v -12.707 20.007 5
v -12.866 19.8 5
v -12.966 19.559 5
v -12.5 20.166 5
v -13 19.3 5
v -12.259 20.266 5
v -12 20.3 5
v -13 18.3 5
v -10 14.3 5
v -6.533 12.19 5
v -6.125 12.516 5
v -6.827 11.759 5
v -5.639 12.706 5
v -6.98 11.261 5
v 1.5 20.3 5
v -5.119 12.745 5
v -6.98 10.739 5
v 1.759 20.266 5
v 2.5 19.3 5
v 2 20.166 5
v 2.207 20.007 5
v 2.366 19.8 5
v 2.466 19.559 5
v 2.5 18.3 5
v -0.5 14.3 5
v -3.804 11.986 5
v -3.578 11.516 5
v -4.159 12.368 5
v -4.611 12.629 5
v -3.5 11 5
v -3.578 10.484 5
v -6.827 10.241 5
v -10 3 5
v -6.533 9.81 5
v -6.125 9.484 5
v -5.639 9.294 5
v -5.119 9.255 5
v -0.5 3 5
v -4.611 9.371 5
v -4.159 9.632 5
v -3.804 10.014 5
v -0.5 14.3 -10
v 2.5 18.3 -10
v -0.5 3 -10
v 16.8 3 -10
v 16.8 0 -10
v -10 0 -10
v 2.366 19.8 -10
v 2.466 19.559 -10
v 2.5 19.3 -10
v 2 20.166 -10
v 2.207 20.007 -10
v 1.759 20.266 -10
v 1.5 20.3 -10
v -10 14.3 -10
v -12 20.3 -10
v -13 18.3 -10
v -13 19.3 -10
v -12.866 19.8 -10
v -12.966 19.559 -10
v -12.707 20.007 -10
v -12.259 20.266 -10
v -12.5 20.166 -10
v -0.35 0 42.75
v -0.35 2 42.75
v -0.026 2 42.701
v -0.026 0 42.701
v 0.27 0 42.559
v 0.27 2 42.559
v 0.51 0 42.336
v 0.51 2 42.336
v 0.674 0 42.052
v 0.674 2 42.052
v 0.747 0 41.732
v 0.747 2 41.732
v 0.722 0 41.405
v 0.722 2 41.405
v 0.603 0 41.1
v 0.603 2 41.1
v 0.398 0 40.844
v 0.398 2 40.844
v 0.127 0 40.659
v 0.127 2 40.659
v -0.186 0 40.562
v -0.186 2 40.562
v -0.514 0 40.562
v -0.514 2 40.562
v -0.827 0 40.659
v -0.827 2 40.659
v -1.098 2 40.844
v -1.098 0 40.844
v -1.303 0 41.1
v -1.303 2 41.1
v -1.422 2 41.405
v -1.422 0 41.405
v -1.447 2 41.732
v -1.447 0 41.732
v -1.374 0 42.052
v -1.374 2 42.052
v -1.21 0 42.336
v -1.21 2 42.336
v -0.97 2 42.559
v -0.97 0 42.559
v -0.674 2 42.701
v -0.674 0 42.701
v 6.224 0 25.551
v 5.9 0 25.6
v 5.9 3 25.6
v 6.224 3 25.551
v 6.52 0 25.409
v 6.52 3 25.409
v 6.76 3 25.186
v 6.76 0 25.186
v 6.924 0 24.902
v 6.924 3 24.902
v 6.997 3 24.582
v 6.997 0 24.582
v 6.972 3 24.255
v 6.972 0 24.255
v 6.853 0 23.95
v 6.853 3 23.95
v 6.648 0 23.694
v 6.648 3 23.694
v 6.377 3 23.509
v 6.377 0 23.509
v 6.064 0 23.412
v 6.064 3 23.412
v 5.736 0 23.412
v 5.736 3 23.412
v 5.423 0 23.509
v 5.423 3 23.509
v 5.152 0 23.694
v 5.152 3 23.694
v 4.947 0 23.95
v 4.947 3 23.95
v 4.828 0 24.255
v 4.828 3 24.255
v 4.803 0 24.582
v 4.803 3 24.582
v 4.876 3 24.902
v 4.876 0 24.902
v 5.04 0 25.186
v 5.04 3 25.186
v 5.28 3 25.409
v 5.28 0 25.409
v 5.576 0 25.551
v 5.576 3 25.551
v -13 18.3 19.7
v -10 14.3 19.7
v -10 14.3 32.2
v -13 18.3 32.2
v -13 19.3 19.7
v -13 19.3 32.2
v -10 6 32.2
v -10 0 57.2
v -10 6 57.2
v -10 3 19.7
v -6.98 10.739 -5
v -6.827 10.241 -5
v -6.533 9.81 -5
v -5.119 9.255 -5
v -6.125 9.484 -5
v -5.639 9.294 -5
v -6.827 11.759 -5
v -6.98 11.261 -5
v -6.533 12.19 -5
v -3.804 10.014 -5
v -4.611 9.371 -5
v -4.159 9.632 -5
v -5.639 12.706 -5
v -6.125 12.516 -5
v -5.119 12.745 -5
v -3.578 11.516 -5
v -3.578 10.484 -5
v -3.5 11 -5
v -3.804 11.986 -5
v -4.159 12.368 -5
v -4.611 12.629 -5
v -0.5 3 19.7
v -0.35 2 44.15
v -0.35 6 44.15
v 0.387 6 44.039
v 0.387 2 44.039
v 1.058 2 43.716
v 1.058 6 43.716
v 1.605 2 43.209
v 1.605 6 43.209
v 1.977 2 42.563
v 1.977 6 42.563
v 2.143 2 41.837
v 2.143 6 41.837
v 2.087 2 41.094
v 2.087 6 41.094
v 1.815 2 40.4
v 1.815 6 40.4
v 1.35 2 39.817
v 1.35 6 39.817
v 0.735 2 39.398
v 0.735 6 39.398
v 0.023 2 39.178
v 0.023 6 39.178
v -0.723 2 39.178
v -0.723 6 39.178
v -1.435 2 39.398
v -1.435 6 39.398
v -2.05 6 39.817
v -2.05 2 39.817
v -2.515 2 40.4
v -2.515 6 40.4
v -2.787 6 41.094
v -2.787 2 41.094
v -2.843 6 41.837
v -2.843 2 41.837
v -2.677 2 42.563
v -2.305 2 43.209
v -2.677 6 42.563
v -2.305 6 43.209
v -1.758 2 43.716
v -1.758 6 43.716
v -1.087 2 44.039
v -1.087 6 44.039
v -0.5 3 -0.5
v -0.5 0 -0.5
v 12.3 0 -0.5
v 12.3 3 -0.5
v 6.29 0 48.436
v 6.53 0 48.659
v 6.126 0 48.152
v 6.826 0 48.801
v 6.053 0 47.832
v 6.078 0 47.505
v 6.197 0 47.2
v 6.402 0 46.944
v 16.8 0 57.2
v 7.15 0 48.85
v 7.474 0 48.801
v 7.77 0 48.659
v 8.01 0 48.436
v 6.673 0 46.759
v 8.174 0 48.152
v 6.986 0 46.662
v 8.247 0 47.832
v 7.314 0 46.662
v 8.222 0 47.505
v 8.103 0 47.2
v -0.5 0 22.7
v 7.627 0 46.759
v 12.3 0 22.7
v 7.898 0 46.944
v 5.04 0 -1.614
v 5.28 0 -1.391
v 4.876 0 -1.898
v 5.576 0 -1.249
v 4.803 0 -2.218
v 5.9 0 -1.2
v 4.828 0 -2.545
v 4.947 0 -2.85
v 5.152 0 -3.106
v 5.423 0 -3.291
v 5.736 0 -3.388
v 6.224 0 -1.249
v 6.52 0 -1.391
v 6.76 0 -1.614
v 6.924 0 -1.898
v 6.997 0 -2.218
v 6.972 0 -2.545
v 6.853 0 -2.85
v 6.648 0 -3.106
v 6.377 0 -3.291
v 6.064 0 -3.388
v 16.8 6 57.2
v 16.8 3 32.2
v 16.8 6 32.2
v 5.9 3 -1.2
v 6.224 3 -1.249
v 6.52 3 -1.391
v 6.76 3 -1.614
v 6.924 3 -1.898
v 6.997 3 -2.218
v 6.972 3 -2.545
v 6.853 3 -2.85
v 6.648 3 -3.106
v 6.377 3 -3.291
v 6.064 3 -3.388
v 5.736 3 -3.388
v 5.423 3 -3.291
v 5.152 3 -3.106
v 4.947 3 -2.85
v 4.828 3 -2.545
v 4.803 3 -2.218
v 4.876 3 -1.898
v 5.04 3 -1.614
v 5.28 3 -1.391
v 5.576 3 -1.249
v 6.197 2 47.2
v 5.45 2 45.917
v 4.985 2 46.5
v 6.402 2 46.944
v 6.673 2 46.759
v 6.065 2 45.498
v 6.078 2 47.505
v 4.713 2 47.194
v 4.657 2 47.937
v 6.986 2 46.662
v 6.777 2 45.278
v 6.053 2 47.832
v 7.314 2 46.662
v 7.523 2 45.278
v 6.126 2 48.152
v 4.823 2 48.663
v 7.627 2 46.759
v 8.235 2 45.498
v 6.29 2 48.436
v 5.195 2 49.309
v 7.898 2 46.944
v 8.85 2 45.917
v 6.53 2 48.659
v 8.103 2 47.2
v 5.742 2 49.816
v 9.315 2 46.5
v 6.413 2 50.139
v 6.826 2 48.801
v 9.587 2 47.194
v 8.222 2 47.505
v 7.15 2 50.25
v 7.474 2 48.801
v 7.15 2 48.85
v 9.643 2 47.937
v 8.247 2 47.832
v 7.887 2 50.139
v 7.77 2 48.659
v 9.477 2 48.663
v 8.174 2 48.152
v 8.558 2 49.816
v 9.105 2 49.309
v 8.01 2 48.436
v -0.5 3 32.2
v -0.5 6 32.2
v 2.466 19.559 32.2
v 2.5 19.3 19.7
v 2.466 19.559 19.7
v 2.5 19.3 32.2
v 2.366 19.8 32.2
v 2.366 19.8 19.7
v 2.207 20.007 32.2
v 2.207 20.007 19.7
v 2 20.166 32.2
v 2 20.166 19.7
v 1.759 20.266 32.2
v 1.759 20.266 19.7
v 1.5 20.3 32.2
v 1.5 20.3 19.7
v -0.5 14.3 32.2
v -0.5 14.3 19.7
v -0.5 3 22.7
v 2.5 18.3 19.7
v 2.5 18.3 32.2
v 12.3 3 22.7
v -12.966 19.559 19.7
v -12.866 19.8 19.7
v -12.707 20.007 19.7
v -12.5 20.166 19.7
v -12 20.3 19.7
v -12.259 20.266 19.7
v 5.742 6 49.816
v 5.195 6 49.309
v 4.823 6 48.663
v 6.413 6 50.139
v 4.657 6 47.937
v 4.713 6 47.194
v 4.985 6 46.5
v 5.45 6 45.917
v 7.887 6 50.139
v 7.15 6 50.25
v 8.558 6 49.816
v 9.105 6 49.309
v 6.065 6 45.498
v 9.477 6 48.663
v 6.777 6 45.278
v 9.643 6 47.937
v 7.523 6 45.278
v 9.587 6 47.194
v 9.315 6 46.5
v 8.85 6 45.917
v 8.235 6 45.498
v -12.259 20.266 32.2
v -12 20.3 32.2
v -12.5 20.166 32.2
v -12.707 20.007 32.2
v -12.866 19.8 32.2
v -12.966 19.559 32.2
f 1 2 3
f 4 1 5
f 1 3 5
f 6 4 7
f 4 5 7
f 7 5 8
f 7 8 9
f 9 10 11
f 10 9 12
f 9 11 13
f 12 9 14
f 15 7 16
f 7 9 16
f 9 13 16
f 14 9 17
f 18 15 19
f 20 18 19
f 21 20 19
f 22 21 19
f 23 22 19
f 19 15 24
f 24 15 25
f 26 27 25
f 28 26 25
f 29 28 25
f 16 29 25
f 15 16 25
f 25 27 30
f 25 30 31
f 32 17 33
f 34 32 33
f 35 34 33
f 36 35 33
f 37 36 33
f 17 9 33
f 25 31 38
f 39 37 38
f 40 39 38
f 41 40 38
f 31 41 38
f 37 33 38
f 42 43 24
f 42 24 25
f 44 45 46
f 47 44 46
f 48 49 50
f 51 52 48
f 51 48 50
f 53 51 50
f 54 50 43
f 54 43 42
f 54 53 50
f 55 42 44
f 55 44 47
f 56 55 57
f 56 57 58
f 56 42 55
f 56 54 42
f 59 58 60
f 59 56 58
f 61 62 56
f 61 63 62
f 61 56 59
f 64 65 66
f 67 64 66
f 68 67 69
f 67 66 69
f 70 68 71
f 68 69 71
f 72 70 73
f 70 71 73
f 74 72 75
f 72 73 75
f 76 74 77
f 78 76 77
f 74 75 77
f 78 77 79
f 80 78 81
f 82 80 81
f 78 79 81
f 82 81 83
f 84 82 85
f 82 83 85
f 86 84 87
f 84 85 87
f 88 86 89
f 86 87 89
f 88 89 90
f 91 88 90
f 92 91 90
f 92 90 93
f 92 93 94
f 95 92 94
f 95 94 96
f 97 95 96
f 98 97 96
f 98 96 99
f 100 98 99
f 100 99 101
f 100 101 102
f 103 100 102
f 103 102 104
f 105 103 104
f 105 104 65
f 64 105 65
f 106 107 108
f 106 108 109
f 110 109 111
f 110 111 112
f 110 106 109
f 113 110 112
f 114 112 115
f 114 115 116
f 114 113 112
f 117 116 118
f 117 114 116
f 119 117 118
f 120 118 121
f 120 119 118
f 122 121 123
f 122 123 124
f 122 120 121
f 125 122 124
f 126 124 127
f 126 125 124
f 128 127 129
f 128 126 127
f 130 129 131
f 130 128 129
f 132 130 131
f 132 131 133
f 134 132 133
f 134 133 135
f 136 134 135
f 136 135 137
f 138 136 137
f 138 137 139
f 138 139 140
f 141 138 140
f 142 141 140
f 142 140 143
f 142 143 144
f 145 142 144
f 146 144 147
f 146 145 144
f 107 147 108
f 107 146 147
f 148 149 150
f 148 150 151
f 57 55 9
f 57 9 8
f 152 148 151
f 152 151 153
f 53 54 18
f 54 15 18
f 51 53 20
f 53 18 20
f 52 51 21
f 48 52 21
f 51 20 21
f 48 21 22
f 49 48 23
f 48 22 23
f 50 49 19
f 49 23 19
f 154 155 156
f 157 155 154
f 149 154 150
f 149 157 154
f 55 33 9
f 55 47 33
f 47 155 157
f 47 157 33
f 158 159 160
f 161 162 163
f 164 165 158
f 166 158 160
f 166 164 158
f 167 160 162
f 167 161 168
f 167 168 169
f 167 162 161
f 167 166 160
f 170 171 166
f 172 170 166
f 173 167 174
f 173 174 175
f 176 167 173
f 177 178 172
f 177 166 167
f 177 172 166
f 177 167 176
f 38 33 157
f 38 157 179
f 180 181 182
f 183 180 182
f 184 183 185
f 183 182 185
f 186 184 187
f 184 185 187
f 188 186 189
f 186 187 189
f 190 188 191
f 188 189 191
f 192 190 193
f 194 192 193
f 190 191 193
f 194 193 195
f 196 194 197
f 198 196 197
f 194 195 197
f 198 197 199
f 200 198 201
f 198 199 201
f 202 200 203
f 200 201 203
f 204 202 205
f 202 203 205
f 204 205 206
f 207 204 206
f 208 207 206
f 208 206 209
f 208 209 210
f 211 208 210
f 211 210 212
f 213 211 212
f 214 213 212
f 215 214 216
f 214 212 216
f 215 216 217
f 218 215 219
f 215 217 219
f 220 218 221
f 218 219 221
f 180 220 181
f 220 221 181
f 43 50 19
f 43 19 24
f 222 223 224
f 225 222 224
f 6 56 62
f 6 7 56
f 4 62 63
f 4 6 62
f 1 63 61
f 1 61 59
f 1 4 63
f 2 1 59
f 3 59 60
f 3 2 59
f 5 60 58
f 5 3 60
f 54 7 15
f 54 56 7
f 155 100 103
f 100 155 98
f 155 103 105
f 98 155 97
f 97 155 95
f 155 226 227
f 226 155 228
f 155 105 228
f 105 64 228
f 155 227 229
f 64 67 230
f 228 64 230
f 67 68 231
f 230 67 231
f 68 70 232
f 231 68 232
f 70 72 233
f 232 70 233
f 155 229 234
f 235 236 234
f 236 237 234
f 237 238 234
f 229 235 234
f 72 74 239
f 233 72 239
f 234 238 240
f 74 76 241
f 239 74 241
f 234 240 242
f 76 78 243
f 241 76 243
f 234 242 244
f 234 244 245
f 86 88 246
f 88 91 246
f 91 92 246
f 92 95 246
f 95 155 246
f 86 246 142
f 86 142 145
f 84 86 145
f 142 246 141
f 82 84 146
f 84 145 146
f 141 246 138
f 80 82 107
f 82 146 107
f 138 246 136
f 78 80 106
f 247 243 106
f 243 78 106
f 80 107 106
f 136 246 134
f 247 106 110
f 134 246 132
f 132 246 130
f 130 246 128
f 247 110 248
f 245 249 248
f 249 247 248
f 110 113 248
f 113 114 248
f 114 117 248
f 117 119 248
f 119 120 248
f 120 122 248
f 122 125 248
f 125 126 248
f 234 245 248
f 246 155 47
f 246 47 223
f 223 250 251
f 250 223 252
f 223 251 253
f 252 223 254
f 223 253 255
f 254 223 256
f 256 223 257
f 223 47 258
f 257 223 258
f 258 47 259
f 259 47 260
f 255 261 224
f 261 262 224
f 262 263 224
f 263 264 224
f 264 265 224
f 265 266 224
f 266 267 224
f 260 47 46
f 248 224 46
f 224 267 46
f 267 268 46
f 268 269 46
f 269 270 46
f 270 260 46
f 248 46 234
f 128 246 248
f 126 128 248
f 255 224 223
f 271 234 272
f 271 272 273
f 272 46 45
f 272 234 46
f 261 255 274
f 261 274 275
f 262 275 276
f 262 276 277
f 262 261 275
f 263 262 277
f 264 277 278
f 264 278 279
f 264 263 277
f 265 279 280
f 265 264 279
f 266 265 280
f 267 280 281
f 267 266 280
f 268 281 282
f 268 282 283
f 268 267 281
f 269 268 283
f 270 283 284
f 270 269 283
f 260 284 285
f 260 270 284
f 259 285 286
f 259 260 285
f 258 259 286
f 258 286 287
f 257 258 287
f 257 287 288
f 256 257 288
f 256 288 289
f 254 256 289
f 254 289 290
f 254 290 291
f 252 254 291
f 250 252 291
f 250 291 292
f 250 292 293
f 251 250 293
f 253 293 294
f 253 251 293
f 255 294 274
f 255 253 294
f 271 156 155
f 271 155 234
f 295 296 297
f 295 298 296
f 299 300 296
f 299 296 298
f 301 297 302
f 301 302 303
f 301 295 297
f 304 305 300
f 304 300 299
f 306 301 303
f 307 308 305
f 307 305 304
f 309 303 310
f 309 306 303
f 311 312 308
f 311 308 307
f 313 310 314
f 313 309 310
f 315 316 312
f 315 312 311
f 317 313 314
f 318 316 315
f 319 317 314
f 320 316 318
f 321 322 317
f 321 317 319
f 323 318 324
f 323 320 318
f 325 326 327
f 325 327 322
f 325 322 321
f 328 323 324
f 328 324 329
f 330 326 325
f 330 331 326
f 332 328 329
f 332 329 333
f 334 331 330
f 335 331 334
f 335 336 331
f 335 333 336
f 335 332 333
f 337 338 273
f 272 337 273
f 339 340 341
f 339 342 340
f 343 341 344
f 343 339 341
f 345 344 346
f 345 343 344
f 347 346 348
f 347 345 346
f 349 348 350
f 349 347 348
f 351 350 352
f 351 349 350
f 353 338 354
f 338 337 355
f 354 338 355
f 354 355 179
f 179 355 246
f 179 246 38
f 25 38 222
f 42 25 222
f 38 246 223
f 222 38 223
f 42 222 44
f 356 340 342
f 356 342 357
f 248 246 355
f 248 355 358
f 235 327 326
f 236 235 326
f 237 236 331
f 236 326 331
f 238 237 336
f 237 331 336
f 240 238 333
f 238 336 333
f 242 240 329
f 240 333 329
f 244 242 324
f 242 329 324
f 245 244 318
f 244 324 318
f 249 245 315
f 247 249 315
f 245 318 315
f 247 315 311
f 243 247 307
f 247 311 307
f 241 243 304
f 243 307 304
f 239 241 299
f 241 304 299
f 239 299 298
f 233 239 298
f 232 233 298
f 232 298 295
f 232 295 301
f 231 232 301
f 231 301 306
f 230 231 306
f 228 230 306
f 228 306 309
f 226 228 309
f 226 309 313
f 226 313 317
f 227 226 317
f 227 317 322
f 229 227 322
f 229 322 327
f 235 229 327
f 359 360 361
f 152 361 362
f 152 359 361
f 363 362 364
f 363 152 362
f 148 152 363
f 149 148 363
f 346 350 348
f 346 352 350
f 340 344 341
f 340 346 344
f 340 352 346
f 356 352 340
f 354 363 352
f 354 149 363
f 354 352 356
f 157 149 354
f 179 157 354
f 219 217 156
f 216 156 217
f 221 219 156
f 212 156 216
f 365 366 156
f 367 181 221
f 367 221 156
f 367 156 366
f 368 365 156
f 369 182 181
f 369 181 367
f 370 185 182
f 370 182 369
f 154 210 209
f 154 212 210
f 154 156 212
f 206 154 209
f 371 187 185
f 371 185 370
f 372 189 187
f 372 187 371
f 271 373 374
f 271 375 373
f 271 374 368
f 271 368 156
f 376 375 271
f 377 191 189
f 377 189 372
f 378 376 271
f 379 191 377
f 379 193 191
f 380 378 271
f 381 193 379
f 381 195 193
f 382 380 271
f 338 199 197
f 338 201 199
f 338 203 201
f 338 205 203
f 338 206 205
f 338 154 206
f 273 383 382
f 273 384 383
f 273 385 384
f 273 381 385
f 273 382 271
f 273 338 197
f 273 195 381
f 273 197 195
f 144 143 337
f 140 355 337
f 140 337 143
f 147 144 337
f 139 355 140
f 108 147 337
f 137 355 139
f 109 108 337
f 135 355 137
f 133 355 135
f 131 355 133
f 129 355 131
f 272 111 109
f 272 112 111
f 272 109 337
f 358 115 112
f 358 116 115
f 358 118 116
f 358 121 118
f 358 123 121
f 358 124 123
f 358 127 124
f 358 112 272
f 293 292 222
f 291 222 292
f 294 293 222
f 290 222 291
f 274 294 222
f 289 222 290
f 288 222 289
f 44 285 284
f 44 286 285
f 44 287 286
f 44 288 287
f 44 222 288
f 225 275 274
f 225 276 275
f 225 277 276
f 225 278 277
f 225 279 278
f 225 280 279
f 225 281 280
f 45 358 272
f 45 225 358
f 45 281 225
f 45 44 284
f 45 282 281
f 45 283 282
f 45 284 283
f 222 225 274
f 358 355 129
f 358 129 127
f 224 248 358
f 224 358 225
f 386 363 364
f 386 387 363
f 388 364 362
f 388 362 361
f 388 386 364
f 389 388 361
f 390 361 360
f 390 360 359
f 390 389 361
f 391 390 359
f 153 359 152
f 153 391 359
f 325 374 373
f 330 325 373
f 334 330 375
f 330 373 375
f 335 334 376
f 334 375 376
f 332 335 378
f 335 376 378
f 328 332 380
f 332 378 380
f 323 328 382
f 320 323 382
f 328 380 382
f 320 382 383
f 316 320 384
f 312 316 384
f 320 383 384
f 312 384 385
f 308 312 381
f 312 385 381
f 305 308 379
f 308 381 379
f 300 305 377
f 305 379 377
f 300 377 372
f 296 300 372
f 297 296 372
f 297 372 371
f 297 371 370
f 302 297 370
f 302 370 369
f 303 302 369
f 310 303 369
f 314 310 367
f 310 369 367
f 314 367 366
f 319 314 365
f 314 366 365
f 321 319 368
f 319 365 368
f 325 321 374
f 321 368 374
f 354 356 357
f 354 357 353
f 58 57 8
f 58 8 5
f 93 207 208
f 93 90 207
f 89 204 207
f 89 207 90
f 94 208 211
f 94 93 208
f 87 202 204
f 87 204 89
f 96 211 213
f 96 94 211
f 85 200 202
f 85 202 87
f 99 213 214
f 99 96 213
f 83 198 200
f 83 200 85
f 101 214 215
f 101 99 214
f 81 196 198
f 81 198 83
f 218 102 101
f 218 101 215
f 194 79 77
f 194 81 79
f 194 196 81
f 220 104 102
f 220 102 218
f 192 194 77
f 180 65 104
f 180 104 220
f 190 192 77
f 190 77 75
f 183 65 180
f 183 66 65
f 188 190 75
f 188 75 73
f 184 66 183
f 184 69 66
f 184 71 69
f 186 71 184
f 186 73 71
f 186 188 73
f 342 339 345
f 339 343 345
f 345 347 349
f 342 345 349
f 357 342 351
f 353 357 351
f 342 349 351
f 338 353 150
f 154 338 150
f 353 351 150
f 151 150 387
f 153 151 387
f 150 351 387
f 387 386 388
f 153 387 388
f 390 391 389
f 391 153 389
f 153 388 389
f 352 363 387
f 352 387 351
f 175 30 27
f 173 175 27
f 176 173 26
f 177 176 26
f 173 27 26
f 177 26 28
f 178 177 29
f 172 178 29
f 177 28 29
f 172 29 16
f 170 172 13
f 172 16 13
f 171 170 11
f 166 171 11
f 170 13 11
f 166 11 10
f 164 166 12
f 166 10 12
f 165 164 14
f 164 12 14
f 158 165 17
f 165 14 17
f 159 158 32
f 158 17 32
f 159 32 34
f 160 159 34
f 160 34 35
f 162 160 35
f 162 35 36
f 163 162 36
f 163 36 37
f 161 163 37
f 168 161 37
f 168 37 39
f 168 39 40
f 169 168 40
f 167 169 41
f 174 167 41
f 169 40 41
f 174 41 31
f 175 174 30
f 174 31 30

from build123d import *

# Parameters (mm, degrees)
SKETCH_5_W          = 26.8
SKETCH_5_H          = 42.2
SKETCH_5_R          = 1.1
SKETCH_5_W_2        = 12.8
SKETCH_5_H_2        = 23.2
EXTRUDE_1_DEPTH     = 3
SKETCH_7_W          = 9.5
SKETCH_7_H          = 15
SKETCH_7_H_2        = 12.5
EXTRUDE_2_DEPTH     = 17.3
SKETCH_10_R         = 1.75
CUT_EXTRUDE_2_DEPTH = 10
EXTRUDE_START       = -42.2
EXTRUDE_3_DEPTH     = 42.2
SKETCH_16_W         = 15.5
SKETCH_16_H         = 14.7
CUT_EXTRUDE_3_DEPTH = 17.3
FILLET_1_R          = 1
SKETCH_20_W         = 26.8
SKETCH_20_H         = 6
EXTRUDE_5_DEPTH     = 25
SKETCH_21_R         = 2.5
CUT_EXTRUDE_6_DEPTH = 4
SKETCH_22_R         = 1.1
CUT_EXTRUDE_7_DEPTH = 63.361606779


with BuildPart() as part:
    # 草图5 → 凸台-拉伸1 (new body)
    with BuildSketch(Plane(origin=(0, 0, 0), x_dir=(1, 0, 0), z_dir=(0, 1, 0))):
        with Locations((3.4, -11.1)):
            Rectangle(SKETCH_5_W, SKETCH_5_H)
        with Locations(Location((5.9, 2.3, 0), (0, 0, 270))):
            Circle(SKETCH_5_R, mode=Mode.SUBTRACT)
        with Locations(Location((5.9, -24.5, 0), (0, 0, 270))):
            Circle(SKETCH_5_R, mode=Mode.SUBTRACT)
        with Locations((5.9, -11.1)):
            Rectangle(SKETCH_5_W_2, SKETCH_5_H_2, mode=Mode.SUBTRACT)
    extrude(amount=EXTRUDE_1_DEPTH)

    # 草图7 → 凸台-拉伸2 (add)
    with BuildSketch(Plane(origin=(0, 3, 0), x_dir=(1, 0, 0), z_dir=(0, 1, 0))):
        with Locations((-5.25, 2.5)):
            Rectangle(SKETCH_7_W, SKETCH_7_H)
        with Locations((-5.25, -25.95)):
            Rectangle(SKETCH_7_W, SKETCH_7_H_2)
    extrude(amount=EXTRUDE_2_DEPTH)

    # 草图10 → 切除-拉伸2 (cut)
    with BuildSketch(Plane.XY.offset(5)):
        with Locations((-5.25, 11)):
            Circle(SKETCH_10_R)
    extrude(amount=-CUT_EXTRUDE_2_DEPTH, mode=Mode.SUBTRACT)

    # 草图13 → 凸台-拉伸3 (add)
    with BuildSketch(Plane.XY.offset(32.2).offset(EXTRUDE_START)):
        Polygon((-0.5, 20.3), (2.5, 20.3), (2.5, 18.3), (-0.5, 14.3), (-0.5, 15.553856002), align=None)
        Polygon((-10, 15.553856002), (-10, 14.3), (-13, 18.3), (-13, 20.3), (-10, 20.3), align=None)
    extrude(amount=EXTRUDE_3_DEPTH)

    # 草图16 → 切除-拉伸3 (cut)
    with BuildSketch(Plane(origin=(0, 20.3, 0), x_dir=(1, 0, 0), z_dir=(0, 1, 0))):
        with Locations((-5.25, -12.35)):
            Rectangle(SKETCH_16_W, SKETCH_16_H)
    extrude(amount=-CUT_EXTRUDE_3_DEPTH, mode=Mode.SUBTRACT)

    # 圆角1
    fillet_1_edges = [part.edges().sort_by_distance(p)[0] for p in [
        (-13, 20.3, 25.95),
        (2.5, 20.3, 25.95),
        (2.5, 20.3, -2.5),
        (-13, 20.3, -2.5),
    ]]
    fillet(fillet_1_edges, radius=FILLET_1_R)

    # 草图20 → 凸台-拉伸5 (add)
    with BuildSketch(Plane.XY.offset(32.2)):
        with Locations((3.4, 3)):
            Rectangle(SKETCH_20_W, SKETCH_20_H)
    extrude(amount=EXTRUDE_5_DEPTH)

    # 草图21 → 切除-拉伸6 (cut)
    with BuildSketch(Plane(origin=(0, 6, 0), x_dir=(1, 0, 0), z_dir=(0, 1, 0))):
        with Locations(Location((7.15, -47.75, 0), (0, 0, 270))):
            Circle(SKETCH_21_R)
        with Locations(Location((-0.35, -41.65, 0), (0, 0, 270))):
            Circle(SKETCH_21_R)
    extrude(amount=-CUT_EXTRUDE_6_DEPTH, mode=Mode.SUBTRACT)

    # 草图22 → 切除-拉伸7 (cut, through all)
    with BuildSketch(Plane(origin=(0, 2, 0), x_dir=(1, 0, 0), z_dir=(0, 1, 0))):
        with Locations(Location((-0.35, -41.65, 0), (0, 0, 270))):
            Circle(SKETCH_22_R)
        with Locations(Location((7.15, -47.75, 0), (0, 0, 270))):
            Circle(SKETCH_22_R)
    extrude(amount=-CUT_EXTRUDE_7_DEPTH, mode=Mode.SUBTRACT)


solid = part.part
